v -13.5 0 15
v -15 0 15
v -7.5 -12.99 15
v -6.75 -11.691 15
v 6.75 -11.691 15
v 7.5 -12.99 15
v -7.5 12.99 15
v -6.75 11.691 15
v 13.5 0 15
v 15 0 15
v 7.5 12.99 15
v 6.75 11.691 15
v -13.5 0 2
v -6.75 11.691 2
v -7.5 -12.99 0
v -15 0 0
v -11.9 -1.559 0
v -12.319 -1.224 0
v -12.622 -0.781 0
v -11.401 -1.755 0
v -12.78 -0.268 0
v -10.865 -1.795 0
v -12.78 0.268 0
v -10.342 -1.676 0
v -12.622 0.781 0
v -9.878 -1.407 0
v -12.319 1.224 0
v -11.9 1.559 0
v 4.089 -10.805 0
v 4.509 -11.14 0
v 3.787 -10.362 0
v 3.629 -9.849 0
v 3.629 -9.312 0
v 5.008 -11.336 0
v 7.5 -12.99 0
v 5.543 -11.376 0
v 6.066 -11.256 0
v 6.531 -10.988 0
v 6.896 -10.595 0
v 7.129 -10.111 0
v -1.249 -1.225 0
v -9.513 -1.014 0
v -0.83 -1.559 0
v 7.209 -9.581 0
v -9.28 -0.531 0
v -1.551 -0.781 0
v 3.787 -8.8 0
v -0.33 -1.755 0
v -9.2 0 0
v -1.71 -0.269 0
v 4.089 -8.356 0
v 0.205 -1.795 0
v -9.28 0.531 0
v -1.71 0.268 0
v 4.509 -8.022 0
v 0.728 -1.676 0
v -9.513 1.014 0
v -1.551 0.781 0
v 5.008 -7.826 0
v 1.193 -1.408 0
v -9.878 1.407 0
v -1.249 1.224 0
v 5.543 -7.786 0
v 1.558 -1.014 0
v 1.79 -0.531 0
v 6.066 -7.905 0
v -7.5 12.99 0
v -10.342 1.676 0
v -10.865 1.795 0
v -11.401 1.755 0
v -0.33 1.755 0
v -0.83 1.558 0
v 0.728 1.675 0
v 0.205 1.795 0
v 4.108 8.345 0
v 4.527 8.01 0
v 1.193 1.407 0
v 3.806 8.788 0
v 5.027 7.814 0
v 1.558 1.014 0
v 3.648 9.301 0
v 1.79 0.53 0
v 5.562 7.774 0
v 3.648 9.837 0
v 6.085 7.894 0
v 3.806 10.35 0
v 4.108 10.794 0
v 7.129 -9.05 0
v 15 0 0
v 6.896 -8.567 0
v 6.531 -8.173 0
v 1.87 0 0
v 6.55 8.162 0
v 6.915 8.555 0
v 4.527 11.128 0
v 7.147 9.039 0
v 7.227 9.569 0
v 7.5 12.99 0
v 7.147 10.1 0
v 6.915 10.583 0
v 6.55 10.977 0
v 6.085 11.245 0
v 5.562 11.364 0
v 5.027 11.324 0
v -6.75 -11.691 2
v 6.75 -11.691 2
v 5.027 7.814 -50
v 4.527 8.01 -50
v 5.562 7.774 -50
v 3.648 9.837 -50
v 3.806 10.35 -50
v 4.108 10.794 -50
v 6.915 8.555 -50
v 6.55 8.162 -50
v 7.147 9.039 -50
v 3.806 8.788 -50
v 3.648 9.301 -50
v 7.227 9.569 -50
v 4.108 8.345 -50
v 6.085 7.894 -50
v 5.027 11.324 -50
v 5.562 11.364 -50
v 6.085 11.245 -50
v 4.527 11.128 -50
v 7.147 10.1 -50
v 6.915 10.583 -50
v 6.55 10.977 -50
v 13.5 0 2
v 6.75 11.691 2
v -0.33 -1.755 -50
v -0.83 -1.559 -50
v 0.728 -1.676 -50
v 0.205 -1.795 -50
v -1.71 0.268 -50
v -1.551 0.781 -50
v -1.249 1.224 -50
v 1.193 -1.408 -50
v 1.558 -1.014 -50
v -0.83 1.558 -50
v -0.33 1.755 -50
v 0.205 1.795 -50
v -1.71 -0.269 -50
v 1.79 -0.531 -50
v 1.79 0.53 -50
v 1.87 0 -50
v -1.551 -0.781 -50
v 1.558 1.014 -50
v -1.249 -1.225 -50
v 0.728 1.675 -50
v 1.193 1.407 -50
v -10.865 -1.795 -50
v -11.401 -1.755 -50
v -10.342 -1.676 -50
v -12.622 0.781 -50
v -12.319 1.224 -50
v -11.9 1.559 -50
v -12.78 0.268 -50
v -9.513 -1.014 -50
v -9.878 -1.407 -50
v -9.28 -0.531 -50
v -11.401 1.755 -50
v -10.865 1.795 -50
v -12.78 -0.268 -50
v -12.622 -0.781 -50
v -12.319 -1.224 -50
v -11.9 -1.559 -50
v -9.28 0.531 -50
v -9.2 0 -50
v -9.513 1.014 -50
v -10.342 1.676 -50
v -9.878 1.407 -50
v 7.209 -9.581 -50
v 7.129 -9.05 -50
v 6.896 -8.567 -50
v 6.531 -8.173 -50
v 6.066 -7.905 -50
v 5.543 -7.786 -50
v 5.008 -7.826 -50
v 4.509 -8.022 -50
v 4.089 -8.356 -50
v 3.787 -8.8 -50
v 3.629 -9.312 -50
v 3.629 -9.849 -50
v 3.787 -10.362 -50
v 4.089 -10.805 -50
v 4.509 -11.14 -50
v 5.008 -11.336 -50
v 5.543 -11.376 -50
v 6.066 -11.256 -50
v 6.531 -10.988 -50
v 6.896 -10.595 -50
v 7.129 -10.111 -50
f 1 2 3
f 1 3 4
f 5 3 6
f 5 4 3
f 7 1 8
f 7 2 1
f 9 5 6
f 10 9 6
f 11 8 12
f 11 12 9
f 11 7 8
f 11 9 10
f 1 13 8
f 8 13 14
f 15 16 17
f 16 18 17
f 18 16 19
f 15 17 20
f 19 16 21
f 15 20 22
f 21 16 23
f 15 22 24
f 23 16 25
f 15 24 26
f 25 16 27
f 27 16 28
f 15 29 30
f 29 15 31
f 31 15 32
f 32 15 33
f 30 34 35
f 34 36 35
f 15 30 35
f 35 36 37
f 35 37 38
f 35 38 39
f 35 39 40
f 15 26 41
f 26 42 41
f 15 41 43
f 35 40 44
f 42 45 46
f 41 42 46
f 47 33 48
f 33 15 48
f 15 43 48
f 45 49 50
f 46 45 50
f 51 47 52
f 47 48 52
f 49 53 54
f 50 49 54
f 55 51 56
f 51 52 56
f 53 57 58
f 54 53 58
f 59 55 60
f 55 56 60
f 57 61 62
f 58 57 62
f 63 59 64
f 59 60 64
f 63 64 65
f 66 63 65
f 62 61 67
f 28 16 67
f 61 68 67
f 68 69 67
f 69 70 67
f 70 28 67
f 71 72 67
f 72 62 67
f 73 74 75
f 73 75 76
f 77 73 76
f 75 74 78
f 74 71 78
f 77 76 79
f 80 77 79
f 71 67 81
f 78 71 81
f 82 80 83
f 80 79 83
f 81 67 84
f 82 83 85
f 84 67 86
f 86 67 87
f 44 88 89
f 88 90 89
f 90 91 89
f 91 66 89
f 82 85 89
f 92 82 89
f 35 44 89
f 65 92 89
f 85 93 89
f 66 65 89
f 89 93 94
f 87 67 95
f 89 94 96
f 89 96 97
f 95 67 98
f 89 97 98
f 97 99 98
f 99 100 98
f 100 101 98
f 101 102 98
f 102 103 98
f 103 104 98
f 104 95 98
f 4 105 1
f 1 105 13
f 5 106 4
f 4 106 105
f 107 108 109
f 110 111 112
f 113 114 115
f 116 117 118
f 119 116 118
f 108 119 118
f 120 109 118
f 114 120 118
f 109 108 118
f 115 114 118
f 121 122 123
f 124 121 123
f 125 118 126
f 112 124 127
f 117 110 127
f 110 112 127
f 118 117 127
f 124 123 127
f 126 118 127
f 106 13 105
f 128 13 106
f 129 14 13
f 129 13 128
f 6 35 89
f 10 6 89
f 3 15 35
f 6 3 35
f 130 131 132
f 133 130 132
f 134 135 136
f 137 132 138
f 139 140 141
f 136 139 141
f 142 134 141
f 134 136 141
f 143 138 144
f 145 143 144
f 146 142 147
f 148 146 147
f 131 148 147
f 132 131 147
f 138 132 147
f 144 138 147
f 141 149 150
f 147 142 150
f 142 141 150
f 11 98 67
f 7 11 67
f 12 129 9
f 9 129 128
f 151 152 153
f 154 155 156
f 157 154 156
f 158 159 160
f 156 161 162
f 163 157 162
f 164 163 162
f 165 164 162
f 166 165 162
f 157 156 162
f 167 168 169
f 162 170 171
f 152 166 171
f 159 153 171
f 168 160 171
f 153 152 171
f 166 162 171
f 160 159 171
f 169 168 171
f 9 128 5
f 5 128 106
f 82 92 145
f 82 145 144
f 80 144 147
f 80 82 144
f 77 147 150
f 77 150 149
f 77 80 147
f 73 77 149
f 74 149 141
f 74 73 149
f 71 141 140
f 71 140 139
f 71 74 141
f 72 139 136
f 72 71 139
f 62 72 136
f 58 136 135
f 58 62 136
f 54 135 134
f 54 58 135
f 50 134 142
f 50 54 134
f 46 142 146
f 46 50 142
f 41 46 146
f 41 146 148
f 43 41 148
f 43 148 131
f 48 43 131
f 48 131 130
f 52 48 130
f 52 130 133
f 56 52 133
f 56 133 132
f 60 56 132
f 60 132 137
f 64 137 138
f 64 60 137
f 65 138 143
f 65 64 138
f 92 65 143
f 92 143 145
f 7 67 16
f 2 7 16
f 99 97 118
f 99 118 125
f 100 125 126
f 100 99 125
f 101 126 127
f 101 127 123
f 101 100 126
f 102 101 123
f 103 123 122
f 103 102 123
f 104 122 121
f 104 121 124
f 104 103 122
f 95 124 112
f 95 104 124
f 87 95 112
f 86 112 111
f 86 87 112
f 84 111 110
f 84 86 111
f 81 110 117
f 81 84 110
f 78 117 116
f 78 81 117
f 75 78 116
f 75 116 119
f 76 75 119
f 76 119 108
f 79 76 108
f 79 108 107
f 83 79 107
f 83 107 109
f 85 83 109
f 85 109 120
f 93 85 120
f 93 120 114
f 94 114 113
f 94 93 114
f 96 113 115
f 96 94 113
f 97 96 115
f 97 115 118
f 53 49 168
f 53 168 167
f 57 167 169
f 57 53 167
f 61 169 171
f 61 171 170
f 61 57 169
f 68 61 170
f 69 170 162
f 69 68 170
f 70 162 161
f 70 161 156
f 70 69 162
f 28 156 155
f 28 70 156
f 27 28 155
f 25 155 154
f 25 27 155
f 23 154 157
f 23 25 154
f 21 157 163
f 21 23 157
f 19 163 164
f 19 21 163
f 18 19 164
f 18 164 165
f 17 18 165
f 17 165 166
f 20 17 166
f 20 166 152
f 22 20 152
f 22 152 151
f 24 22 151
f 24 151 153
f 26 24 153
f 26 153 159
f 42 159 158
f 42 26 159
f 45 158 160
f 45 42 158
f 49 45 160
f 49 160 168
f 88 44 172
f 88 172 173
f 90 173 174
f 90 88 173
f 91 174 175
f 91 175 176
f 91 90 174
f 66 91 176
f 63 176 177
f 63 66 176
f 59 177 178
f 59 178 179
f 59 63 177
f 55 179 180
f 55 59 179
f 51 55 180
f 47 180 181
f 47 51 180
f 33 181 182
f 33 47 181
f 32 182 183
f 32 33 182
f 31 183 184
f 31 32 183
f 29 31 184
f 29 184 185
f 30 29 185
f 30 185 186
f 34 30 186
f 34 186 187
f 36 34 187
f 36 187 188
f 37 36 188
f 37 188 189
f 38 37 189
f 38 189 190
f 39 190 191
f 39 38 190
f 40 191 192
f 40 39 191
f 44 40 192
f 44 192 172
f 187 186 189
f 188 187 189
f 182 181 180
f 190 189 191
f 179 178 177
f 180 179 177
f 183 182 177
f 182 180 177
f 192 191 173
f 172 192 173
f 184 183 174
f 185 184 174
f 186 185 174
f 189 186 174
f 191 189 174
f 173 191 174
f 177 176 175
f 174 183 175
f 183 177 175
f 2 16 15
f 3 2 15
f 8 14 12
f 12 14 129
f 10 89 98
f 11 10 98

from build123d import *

# Parameters (mm, degrees)
F1_DEPTH = 15
F2_DEPTH = 2
F3_R     = 1.8
F4_DEPTH = 50


with BuildPart() as f1:
    # F0 (on Top) → F1 (new body)
    with BuildSketch(Plane.XY):
        Polygon((7.5, -12.990381), (15, 0), (7.5, 12.990381), (-7.5, 12.990381), (-15, 0), (-7.5, -12.990381), align=None)
        Polygon((6.75, 11.691343), (13.5, 0), (6.75, -11.691343), (-6.75, -11.691343), (-13.5, 0), (-6.75, 11.691343), align=None, mode=Mode.SUBTRACT)
    extrude(amount=F1_DEPTH)

    # F0 (on Top) → F2 (join)
    with BuildSketch(Plane.XY):
        Polygon((6.75, -11.691343), (13.5, 0), (6.75, 11.691343), (-6.75, 11.691343), (-13.5, 0), (-6.75, -11.691343), align=None)
    extrude(amount=F2_DEPTH)

    # F3 (on Top) → F4 (join)
    with BuildSketch(Plane.XY):
        with Locations((-11, 0)):
            Circle(F3_R)
        with Locations((5.427412, 9.569215)):
            Circle(F3_R)
        with Locations((5.408632, -9.580663)):
            Circle(F3_R)
        with Locations((0.070379, -0.000349)):
            Circle(F3_R)
    extrude(amount=-F4_DEPTH)


solid = f1.part
